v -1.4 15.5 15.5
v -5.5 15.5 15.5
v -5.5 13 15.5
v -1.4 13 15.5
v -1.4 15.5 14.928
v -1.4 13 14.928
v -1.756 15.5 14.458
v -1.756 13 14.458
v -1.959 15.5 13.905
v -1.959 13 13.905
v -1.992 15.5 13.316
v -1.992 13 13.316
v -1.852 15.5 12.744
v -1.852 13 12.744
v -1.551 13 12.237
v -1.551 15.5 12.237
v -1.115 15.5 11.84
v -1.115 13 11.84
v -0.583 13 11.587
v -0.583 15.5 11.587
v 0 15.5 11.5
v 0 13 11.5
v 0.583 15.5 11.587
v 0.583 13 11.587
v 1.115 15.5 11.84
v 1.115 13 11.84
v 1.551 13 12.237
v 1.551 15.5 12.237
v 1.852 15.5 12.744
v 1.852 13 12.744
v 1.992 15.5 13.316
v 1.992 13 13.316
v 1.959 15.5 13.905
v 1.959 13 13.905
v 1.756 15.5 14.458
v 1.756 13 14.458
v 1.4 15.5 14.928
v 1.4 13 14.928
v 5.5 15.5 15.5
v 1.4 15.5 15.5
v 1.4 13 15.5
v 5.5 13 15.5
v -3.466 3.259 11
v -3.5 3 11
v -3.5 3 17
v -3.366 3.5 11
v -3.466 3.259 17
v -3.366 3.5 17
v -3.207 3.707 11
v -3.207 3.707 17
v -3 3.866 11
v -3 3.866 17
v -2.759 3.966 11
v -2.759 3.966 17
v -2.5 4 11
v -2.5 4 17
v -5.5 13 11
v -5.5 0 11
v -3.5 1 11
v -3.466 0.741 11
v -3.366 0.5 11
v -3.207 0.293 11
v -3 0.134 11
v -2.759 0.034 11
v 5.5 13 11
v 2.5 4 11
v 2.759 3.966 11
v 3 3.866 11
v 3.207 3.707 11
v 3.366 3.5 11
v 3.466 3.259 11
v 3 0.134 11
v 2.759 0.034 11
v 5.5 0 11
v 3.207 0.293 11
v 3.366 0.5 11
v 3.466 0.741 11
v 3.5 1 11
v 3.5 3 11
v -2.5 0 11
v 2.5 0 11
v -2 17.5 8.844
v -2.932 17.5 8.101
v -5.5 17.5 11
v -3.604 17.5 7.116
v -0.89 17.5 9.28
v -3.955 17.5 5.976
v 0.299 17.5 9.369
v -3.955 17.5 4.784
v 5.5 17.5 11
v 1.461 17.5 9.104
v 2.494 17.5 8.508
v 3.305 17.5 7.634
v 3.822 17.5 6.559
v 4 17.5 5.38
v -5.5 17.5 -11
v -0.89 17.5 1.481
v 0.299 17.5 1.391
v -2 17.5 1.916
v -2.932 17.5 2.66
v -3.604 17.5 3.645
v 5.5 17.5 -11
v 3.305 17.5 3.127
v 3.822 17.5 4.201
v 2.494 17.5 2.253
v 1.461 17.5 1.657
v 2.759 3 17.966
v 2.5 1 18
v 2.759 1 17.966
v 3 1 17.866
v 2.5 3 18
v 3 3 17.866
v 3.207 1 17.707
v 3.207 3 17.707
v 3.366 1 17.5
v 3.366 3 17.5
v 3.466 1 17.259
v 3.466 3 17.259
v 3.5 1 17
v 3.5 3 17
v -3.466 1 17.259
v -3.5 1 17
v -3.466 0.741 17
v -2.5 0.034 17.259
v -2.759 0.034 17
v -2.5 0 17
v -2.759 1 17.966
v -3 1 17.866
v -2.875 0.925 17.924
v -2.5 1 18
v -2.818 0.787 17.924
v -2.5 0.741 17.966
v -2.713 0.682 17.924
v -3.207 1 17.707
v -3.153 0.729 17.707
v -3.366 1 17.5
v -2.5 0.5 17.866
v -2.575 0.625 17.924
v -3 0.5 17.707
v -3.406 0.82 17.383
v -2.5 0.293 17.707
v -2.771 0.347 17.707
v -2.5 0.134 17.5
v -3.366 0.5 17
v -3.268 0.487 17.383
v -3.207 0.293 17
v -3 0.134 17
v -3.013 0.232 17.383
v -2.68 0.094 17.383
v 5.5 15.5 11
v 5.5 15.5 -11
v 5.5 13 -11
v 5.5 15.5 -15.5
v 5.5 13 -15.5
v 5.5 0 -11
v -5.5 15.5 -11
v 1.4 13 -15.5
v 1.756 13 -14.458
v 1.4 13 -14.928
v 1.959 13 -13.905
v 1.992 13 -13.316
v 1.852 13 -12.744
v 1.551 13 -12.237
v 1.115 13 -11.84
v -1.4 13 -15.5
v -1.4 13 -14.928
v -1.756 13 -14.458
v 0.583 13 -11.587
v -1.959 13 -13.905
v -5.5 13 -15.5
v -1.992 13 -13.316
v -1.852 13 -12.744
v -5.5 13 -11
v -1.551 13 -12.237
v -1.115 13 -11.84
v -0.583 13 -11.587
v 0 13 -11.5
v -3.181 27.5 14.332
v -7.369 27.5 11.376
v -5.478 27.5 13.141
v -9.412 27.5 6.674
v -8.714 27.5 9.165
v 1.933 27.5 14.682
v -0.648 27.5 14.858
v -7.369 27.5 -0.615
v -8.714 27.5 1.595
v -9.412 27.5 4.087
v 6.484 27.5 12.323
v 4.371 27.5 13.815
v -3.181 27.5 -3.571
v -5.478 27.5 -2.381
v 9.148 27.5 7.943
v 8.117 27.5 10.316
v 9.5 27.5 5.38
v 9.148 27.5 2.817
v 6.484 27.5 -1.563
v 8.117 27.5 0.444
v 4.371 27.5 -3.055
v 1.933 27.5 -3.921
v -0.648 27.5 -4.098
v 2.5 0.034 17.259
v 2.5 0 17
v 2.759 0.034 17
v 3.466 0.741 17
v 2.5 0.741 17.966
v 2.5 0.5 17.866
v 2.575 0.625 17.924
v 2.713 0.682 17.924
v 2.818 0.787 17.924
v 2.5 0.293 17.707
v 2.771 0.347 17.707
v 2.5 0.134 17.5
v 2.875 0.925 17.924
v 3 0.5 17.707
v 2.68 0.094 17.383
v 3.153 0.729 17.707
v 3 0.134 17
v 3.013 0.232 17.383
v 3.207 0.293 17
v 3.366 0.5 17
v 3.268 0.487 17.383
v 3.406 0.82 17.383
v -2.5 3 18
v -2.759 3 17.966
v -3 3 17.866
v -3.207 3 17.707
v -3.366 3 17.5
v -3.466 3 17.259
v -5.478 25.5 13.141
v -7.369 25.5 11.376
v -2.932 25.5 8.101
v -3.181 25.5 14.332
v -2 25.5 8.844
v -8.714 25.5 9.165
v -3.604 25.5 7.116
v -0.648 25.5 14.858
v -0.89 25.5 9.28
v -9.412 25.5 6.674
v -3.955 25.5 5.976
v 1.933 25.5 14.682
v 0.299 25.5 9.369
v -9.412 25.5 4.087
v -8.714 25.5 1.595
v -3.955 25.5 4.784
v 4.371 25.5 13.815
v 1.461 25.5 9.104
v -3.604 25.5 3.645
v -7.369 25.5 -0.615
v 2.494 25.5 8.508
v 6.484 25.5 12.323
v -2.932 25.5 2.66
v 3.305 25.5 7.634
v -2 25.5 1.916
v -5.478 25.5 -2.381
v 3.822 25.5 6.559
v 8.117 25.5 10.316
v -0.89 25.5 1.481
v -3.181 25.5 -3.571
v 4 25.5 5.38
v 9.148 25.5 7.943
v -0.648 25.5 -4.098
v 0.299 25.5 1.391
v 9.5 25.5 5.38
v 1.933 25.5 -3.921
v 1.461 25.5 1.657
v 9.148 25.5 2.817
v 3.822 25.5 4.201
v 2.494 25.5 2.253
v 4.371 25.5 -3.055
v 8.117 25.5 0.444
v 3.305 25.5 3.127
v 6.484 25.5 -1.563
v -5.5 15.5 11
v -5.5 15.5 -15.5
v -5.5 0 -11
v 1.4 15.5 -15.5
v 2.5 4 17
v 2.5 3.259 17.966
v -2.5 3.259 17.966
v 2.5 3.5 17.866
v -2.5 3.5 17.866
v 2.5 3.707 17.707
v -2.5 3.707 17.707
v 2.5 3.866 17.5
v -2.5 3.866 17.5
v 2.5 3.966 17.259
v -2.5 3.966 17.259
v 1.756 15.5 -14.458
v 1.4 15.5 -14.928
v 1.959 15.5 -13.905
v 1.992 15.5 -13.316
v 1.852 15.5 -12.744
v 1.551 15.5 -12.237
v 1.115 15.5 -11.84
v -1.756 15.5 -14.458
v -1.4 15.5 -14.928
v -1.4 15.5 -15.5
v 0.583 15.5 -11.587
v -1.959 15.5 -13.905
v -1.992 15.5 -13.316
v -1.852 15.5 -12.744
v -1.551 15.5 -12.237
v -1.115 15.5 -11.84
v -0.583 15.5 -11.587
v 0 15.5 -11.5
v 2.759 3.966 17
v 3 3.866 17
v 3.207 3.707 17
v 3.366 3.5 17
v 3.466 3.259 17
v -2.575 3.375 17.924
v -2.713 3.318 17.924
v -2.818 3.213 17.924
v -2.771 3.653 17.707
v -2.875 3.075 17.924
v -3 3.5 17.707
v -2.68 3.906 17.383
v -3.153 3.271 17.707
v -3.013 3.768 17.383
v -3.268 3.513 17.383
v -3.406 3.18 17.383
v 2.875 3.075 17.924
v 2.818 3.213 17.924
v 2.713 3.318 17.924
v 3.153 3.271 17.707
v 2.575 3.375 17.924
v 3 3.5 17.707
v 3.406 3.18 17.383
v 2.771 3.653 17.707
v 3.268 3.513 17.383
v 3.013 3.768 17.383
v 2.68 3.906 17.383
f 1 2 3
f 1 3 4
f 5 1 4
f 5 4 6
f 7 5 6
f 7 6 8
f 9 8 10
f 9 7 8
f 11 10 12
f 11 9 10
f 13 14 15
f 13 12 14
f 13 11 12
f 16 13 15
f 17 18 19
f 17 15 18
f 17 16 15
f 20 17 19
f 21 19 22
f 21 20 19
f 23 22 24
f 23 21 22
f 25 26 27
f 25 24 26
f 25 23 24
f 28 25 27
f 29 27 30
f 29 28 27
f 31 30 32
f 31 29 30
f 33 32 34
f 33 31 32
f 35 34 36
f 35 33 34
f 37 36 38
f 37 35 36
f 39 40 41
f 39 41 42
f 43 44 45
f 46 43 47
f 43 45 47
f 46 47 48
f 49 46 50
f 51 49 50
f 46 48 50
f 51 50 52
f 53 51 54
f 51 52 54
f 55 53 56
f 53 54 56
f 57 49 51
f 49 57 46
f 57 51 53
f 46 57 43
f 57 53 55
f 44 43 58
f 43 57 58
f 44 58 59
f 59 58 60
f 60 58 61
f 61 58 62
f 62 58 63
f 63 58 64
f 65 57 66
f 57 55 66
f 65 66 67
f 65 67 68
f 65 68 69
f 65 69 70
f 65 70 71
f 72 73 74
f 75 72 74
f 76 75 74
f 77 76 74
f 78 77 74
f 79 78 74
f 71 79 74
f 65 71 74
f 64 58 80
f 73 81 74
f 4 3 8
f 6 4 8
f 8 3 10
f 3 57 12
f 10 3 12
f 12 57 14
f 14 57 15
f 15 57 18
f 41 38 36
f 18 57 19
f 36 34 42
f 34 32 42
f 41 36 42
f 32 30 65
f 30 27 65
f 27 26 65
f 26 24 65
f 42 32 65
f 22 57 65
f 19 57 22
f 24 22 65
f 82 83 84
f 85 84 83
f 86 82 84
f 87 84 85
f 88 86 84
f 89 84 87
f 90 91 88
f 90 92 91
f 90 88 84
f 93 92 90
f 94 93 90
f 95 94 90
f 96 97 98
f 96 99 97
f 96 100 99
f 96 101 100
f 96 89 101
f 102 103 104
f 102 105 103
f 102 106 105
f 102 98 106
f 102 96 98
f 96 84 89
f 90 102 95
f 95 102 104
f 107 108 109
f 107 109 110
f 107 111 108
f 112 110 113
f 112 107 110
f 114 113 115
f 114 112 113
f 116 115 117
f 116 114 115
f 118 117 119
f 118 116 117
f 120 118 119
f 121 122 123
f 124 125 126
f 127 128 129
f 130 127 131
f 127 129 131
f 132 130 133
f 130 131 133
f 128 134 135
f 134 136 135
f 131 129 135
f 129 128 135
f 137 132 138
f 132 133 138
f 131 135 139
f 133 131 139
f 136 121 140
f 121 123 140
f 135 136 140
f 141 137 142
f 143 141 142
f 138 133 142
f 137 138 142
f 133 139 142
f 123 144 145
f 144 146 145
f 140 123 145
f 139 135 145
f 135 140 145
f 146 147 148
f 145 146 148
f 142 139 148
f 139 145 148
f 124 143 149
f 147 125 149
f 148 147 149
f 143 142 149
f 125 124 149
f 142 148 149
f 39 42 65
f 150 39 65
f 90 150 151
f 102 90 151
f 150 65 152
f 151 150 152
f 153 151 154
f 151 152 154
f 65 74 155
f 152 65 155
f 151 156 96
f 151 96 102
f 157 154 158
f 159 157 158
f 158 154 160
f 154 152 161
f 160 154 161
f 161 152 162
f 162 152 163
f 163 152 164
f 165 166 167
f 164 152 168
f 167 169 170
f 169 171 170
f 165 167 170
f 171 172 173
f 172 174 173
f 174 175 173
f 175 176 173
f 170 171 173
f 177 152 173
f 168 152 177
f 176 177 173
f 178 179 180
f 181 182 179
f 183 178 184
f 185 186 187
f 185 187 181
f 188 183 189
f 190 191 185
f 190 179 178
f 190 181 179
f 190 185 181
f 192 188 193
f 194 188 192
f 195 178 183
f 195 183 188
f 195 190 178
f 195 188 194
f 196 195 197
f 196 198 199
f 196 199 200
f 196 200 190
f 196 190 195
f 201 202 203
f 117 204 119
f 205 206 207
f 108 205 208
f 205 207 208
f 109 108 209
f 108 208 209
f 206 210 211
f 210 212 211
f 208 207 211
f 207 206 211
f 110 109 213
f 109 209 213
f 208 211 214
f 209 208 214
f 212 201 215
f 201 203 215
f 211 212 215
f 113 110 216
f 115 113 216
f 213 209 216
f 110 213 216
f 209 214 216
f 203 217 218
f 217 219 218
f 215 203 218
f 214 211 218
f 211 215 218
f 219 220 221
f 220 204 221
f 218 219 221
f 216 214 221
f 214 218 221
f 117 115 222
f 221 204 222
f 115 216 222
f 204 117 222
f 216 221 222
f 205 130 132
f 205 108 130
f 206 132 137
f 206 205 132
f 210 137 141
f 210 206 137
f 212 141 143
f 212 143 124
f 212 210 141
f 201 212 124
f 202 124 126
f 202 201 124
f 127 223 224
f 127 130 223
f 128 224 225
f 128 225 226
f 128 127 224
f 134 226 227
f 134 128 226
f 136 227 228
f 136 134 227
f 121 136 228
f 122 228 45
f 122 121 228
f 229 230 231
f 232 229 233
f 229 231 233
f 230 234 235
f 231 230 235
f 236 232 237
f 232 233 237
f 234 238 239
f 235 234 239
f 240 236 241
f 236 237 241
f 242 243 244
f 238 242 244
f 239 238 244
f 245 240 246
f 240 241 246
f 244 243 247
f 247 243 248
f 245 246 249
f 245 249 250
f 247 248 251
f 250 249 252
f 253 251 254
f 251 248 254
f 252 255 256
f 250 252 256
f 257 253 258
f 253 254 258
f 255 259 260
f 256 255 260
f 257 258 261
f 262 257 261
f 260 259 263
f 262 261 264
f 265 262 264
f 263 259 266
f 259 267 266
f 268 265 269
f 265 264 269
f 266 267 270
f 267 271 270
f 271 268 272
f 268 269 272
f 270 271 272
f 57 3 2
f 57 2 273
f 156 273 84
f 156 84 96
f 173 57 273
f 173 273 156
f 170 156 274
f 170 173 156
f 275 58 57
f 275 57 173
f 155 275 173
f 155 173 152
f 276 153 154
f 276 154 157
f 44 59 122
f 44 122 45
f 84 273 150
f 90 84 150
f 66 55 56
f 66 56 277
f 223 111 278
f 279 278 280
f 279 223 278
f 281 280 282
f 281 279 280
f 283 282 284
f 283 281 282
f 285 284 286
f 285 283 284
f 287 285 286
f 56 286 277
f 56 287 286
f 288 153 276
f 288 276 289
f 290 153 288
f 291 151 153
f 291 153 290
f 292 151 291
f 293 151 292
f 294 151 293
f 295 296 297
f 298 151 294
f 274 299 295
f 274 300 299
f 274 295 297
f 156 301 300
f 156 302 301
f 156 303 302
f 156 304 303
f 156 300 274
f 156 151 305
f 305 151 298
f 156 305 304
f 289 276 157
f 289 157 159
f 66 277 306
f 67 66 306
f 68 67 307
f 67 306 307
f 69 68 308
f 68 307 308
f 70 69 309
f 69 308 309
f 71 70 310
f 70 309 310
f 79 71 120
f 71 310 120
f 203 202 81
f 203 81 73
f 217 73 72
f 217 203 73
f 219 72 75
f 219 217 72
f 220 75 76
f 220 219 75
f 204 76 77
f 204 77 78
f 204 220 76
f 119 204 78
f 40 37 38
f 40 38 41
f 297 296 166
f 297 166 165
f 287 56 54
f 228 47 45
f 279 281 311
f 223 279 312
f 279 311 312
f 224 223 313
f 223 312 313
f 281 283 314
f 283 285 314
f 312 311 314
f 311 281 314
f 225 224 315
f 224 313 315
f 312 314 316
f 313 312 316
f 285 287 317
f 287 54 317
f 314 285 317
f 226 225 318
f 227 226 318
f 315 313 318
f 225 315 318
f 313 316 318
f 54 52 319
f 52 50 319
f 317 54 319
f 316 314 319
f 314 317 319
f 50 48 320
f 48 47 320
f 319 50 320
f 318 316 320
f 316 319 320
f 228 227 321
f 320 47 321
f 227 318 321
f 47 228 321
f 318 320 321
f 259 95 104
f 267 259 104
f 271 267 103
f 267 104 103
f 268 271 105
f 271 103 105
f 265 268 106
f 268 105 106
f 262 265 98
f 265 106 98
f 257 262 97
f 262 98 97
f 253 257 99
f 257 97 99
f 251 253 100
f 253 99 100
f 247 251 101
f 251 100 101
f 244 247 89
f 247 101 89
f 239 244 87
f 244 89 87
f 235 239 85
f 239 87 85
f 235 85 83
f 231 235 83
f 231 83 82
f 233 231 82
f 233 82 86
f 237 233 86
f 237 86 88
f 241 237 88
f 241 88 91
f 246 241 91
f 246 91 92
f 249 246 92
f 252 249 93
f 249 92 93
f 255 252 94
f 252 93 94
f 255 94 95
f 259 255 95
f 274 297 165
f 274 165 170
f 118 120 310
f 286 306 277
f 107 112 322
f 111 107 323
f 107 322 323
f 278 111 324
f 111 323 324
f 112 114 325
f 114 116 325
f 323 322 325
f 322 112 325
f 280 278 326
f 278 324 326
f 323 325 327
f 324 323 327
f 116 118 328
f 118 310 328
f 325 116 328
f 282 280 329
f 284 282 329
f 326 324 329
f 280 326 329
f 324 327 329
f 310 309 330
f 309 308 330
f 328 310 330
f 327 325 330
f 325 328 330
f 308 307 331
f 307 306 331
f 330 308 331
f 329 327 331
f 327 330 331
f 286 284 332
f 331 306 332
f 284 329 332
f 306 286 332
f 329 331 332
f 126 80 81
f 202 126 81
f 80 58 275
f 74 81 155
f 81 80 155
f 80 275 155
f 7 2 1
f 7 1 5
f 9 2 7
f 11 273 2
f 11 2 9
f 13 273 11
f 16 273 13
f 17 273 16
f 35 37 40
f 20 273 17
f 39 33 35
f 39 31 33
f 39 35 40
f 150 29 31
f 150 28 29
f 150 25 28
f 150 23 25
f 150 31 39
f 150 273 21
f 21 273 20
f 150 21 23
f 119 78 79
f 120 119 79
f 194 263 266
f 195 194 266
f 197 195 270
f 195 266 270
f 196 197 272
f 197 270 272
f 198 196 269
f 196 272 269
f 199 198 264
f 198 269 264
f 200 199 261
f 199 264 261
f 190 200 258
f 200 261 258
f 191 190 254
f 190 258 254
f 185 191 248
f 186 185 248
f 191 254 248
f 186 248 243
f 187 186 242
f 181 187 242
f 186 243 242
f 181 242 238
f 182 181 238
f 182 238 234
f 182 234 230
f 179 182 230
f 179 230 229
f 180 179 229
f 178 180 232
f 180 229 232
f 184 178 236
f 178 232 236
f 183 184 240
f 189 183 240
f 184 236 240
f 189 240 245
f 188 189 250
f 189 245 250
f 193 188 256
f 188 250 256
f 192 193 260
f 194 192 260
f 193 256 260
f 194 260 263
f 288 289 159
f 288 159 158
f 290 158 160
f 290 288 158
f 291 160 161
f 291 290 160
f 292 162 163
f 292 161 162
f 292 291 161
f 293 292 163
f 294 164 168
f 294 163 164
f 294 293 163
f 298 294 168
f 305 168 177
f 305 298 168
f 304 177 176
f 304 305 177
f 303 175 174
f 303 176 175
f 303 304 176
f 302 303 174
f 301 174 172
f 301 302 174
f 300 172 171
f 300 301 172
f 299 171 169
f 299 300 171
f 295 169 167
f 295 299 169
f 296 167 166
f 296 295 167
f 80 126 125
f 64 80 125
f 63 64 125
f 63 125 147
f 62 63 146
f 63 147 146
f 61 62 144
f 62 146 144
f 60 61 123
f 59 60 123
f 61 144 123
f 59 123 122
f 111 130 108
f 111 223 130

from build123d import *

# Parameters (mm, degrees)
SKETCH1_W            = 11
SKETCH1_H            = 22
BOSS_EXTRUDE1_DEPTH  = 17.5
SKETCH8_W            = 7
SKETCH8_H            = 4
BOSS_EXTRUDE6_DEPTH  = 7
FILLET1_R            = 1
FILLET2_R            = 1
SKETCH9_W            = 11
SKETCH9_H            = 2.5
BOSS_EXTRUDE7_DEPTH  = 4.5
SKETCH10_W           = 11
SKETCH10_H           = 2.5
BOSS_EXTRUDE8_DEPTH  = 4.5
CUT_EXTRUDE1_DEPTH   = 5
SKETCH2_R            = 4
BOSS_EXTRUDE9_DEPTH  = 8
SKETCH13_R           = 9.5
BOSS_EXTRUDE10_DEPTH = 2


with BuildPart() as part:
    # Sketch1 → Boss-Extrude1 (new body)
    with BuildSketch(Plane(origin=(0, 0, 0), x_dir=(1, 0, 0), z_dir=(0, 1, 0))):
        Rectangle(SKETCH1_W, SKETCH1_H)
    extrude(amount=BOSS_EXTRUDE1_DEPTH)

    # Sketch8 → Boss-Extrude6 (add)
    with BuildSketch(Plane.XY.offset(11)):
        with Locations((0, 2)):
            Rectangle(SKETCH8_W, SKETCH8_H)
    extrude(amount=BOSS_EXTRUDE6_DEPTH)

    # Fillet1
    fillet1_edges = [part.edges().sort_by_distance(p)[0] for p in [
        (-3.5, 0, 14.5),
        (-3.5, 4, 14.5),
        (3.5, 4, 14.5),
        (3.5, 0, 14.5),
    ]]
    fillet(fillet1_edges, radius=FILLET1_R)

    # Fillet2
    fillet2_edges = [part.edges().sort_by_distance(p)[0] for p in [
        (0, 0, 18),
        (-3.5, 2, 18),
        (3.5, 2, 18),
        (0, 4, 18),
        (3.207106781, 0.292893219, 18),
        (3.207106781, 3.707106781, 18),
        (-3.207106781, 3.707106781, 18),
        (-3.207106781, 0.292893219, 18),
    ]]
    fillet(fillet2_edges, radius=FILLET2_R)

    # Sketch9 → Boss-Extrude7 (add)
    with BuildSketch(Plane.XY.offset(11)):
        with Locations((0, 14.25)):
            Rectangle(SKETCH9_W, SKETCH9_H)
    extrude(amount=BOSS_EXTRUDE7_DEPTH)

    # Sketch10 → Boss-Extrude8 (add)
    with BuildSketch(Plane(origin=(0, 0, -11), x_dir=(-1, 0, 0), z_dir=(0, 0, -1))):
        with Locations((0, 14.25)):
            Rectangle(SKETCH10_W, SKETCH10_H)
    extrude(amount=BOSS_EXTRUDE8_DEPTH)

    # Sketch11 → Cut-Extrude1 (cut)
    with BuildSketch(Plane(origin=(0, 17.5, 0), x_dir=(1, 0, 0), z_dir=(0, 1, 0))):
        with BuildLine():
            Line((1.4, 15.5), (1.4, 14.928285686))
            ThreePointArc((1.4, 14.928285686), (0, 11.5), (-1.4, 14.928285686))
            Line((-1.4, 14.928285686), (-1.4, 15.5))
            Line((-1.4, 15.5), (1.4, 15.5))
        make_face()
        with BuildLine():
            Line((-1.4, -15.5), (-1.4, -14.928285686))
            ThreePointArc((-1.4, -14.928285686), (0, -11.5), (1.4, -14.928285686))
            Line((1.4, -14.928285686), (1.4, -15.5))
            Line((1.4, -15.5), (-1.4, -15.5))
        make_face()
    extrude(amount=-CUT_EXTRUDE1_DEPTH, mode=Mode.SUBTRACT)

    # Sketch2 → Boss-Extrude9 (add)
    with BuildSketch(Plane(origin=(0, 17.5, 0), x_dir=(1, 0, 0), z_dir=(0, 1, 0))):
        with Locations((0, -5.38022134)):
            Circle(SKETCH2_R)
    extrude(amount=BOSS_EXTRUDE9_DEPTH)

    # Sketch13 → Boss-Extrude10 (add)
    with BuildSketch(Plane(origin=(0, 25.5, 0), x_dir=(1, 0, 0), z_dir=(0, 1, 0))):
        with Locations((0, -5.38022134)):
            Circle(SKETCH13_R)
    extrude(amount=BOSS_EXTRUDE10_DEPTH)


solid = part.part
